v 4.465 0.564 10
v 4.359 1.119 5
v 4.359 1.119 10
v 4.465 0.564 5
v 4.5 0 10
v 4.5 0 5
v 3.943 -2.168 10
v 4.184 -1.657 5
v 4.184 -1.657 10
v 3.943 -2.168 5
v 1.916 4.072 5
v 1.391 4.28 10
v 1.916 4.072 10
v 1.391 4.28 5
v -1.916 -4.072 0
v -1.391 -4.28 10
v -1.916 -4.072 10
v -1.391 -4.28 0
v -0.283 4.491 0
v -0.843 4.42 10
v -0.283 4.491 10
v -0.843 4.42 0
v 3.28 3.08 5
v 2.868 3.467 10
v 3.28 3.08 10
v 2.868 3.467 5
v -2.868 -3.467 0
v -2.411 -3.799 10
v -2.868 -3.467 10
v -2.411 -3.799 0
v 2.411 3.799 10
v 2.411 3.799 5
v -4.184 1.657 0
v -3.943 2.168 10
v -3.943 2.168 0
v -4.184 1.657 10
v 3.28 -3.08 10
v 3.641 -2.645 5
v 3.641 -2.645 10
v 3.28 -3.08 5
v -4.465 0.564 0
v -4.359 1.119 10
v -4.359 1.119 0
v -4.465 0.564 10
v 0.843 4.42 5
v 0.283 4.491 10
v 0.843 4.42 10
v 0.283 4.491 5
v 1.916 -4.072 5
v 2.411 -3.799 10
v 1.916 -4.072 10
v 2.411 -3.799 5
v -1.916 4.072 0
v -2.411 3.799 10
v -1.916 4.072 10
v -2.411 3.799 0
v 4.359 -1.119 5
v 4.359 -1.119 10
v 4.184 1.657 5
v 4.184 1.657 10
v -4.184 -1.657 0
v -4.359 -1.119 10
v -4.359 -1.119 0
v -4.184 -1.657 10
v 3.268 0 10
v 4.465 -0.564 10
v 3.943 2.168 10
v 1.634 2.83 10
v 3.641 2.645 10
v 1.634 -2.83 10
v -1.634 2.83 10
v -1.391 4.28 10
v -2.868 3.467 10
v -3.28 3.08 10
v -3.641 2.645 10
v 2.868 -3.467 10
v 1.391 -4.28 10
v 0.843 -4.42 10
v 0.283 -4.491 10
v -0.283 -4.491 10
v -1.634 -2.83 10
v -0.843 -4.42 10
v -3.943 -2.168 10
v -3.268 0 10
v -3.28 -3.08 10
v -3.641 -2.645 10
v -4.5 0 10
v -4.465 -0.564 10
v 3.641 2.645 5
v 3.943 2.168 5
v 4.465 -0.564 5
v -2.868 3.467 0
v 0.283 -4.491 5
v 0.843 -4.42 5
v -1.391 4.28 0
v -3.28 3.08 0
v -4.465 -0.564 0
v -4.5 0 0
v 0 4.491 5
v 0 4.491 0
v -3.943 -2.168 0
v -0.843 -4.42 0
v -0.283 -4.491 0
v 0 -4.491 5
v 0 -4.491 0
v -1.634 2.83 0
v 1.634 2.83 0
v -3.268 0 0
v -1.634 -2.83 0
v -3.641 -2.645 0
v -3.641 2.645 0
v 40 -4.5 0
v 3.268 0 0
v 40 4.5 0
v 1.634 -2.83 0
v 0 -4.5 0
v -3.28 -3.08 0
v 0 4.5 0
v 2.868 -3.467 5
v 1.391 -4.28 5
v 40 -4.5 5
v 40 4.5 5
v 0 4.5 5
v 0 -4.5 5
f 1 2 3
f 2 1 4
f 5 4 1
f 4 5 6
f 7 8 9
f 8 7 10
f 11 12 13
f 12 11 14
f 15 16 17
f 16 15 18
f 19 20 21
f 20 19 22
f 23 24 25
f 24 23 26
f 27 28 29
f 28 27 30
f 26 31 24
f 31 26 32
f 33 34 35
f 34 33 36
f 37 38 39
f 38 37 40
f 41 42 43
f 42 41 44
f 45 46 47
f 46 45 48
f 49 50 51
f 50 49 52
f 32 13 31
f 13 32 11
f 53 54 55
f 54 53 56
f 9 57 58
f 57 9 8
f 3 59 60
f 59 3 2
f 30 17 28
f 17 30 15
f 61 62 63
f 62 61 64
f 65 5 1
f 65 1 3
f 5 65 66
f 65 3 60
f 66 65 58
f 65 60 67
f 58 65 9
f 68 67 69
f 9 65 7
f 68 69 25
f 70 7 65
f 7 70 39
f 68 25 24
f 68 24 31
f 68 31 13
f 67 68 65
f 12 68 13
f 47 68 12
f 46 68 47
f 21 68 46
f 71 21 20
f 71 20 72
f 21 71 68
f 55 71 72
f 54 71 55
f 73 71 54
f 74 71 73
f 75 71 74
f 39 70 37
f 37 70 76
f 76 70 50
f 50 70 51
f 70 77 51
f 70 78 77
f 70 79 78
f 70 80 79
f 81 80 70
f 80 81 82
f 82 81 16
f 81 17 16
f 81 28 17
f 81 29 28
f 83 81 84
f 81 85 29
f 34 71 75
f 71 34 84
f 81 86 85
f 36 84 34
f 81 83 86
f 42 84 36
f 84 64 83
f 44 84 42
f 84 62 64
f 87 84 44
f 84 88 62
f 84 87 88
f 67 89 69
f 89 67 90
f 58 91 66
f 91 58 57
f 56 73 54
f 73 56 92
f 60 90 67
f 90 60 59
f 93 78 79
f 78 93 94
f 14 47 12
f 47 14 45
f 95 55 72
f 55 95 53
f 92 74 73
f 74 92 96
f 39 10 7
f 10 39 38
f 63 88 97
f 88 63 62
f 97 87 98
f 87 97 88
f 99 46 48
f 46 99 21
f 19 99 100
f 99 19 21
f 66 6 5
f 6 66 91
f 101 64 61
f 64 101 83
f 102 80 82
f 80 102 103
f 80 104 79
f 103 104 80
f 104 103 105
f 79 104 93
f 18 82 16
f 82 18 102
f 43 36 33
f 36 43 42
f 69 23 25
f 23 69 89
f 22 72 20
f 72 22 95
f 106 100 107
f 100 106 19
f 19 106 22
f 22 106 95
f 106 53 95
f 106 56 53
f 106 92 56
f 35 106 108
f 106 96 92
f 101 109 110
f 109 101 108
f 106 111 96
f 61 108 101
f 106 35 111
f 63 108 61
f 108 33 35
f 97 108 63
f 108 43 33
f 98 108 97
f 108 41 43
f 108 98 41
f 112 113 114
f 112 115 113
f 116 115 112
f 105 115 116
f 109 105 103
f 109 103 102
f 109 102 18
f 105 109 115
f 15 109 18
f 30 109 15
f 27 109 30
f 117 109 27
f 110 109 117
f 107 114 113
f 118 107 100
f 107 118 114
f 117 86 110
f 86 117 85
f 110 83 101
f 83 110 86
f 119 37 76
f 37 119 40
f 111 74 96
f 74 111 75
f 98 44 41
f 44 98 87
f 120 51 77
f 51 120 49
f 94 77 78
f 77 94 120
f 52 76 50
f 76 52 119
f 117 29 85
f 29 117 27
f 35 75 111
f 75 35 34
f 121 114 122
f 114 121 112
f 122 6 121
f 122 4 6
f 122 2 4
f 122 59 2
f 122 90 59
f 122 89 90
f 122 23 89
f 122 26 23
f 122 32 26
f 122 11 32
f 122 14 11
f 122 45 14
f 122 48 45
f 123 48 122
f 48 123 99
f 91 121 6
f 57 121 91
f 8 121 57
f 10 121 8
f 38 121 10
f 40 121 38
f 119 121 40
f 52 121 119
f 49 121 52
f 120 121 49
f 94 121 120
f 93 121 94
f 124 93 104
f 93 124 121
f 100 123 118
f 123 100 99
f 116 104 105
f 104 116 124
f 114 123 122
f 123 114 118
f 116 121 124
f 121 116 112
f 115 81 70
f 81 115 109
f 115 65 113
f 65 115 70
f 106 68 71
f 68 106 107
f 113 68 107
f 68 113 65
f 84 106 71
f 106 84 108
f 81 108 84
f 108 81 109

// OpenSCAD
NUT_INSCRIBED_DIAMETER = 5.4;
FUDGE_ADDENDUM = 0.3;

nut_cd = NUT_INSCRIBED_DIAMETER / cos(30);
socket_d = nut_cd + FUDGE_ADDENDUM;

difference(){
    union(){
        cylinder(d=9, h=10, $fn=50);
        translate([0,-4.5,0])cube([40,9,5]);
    }
    cylinder(d=socket_d, h=10, $fn=6);
}
